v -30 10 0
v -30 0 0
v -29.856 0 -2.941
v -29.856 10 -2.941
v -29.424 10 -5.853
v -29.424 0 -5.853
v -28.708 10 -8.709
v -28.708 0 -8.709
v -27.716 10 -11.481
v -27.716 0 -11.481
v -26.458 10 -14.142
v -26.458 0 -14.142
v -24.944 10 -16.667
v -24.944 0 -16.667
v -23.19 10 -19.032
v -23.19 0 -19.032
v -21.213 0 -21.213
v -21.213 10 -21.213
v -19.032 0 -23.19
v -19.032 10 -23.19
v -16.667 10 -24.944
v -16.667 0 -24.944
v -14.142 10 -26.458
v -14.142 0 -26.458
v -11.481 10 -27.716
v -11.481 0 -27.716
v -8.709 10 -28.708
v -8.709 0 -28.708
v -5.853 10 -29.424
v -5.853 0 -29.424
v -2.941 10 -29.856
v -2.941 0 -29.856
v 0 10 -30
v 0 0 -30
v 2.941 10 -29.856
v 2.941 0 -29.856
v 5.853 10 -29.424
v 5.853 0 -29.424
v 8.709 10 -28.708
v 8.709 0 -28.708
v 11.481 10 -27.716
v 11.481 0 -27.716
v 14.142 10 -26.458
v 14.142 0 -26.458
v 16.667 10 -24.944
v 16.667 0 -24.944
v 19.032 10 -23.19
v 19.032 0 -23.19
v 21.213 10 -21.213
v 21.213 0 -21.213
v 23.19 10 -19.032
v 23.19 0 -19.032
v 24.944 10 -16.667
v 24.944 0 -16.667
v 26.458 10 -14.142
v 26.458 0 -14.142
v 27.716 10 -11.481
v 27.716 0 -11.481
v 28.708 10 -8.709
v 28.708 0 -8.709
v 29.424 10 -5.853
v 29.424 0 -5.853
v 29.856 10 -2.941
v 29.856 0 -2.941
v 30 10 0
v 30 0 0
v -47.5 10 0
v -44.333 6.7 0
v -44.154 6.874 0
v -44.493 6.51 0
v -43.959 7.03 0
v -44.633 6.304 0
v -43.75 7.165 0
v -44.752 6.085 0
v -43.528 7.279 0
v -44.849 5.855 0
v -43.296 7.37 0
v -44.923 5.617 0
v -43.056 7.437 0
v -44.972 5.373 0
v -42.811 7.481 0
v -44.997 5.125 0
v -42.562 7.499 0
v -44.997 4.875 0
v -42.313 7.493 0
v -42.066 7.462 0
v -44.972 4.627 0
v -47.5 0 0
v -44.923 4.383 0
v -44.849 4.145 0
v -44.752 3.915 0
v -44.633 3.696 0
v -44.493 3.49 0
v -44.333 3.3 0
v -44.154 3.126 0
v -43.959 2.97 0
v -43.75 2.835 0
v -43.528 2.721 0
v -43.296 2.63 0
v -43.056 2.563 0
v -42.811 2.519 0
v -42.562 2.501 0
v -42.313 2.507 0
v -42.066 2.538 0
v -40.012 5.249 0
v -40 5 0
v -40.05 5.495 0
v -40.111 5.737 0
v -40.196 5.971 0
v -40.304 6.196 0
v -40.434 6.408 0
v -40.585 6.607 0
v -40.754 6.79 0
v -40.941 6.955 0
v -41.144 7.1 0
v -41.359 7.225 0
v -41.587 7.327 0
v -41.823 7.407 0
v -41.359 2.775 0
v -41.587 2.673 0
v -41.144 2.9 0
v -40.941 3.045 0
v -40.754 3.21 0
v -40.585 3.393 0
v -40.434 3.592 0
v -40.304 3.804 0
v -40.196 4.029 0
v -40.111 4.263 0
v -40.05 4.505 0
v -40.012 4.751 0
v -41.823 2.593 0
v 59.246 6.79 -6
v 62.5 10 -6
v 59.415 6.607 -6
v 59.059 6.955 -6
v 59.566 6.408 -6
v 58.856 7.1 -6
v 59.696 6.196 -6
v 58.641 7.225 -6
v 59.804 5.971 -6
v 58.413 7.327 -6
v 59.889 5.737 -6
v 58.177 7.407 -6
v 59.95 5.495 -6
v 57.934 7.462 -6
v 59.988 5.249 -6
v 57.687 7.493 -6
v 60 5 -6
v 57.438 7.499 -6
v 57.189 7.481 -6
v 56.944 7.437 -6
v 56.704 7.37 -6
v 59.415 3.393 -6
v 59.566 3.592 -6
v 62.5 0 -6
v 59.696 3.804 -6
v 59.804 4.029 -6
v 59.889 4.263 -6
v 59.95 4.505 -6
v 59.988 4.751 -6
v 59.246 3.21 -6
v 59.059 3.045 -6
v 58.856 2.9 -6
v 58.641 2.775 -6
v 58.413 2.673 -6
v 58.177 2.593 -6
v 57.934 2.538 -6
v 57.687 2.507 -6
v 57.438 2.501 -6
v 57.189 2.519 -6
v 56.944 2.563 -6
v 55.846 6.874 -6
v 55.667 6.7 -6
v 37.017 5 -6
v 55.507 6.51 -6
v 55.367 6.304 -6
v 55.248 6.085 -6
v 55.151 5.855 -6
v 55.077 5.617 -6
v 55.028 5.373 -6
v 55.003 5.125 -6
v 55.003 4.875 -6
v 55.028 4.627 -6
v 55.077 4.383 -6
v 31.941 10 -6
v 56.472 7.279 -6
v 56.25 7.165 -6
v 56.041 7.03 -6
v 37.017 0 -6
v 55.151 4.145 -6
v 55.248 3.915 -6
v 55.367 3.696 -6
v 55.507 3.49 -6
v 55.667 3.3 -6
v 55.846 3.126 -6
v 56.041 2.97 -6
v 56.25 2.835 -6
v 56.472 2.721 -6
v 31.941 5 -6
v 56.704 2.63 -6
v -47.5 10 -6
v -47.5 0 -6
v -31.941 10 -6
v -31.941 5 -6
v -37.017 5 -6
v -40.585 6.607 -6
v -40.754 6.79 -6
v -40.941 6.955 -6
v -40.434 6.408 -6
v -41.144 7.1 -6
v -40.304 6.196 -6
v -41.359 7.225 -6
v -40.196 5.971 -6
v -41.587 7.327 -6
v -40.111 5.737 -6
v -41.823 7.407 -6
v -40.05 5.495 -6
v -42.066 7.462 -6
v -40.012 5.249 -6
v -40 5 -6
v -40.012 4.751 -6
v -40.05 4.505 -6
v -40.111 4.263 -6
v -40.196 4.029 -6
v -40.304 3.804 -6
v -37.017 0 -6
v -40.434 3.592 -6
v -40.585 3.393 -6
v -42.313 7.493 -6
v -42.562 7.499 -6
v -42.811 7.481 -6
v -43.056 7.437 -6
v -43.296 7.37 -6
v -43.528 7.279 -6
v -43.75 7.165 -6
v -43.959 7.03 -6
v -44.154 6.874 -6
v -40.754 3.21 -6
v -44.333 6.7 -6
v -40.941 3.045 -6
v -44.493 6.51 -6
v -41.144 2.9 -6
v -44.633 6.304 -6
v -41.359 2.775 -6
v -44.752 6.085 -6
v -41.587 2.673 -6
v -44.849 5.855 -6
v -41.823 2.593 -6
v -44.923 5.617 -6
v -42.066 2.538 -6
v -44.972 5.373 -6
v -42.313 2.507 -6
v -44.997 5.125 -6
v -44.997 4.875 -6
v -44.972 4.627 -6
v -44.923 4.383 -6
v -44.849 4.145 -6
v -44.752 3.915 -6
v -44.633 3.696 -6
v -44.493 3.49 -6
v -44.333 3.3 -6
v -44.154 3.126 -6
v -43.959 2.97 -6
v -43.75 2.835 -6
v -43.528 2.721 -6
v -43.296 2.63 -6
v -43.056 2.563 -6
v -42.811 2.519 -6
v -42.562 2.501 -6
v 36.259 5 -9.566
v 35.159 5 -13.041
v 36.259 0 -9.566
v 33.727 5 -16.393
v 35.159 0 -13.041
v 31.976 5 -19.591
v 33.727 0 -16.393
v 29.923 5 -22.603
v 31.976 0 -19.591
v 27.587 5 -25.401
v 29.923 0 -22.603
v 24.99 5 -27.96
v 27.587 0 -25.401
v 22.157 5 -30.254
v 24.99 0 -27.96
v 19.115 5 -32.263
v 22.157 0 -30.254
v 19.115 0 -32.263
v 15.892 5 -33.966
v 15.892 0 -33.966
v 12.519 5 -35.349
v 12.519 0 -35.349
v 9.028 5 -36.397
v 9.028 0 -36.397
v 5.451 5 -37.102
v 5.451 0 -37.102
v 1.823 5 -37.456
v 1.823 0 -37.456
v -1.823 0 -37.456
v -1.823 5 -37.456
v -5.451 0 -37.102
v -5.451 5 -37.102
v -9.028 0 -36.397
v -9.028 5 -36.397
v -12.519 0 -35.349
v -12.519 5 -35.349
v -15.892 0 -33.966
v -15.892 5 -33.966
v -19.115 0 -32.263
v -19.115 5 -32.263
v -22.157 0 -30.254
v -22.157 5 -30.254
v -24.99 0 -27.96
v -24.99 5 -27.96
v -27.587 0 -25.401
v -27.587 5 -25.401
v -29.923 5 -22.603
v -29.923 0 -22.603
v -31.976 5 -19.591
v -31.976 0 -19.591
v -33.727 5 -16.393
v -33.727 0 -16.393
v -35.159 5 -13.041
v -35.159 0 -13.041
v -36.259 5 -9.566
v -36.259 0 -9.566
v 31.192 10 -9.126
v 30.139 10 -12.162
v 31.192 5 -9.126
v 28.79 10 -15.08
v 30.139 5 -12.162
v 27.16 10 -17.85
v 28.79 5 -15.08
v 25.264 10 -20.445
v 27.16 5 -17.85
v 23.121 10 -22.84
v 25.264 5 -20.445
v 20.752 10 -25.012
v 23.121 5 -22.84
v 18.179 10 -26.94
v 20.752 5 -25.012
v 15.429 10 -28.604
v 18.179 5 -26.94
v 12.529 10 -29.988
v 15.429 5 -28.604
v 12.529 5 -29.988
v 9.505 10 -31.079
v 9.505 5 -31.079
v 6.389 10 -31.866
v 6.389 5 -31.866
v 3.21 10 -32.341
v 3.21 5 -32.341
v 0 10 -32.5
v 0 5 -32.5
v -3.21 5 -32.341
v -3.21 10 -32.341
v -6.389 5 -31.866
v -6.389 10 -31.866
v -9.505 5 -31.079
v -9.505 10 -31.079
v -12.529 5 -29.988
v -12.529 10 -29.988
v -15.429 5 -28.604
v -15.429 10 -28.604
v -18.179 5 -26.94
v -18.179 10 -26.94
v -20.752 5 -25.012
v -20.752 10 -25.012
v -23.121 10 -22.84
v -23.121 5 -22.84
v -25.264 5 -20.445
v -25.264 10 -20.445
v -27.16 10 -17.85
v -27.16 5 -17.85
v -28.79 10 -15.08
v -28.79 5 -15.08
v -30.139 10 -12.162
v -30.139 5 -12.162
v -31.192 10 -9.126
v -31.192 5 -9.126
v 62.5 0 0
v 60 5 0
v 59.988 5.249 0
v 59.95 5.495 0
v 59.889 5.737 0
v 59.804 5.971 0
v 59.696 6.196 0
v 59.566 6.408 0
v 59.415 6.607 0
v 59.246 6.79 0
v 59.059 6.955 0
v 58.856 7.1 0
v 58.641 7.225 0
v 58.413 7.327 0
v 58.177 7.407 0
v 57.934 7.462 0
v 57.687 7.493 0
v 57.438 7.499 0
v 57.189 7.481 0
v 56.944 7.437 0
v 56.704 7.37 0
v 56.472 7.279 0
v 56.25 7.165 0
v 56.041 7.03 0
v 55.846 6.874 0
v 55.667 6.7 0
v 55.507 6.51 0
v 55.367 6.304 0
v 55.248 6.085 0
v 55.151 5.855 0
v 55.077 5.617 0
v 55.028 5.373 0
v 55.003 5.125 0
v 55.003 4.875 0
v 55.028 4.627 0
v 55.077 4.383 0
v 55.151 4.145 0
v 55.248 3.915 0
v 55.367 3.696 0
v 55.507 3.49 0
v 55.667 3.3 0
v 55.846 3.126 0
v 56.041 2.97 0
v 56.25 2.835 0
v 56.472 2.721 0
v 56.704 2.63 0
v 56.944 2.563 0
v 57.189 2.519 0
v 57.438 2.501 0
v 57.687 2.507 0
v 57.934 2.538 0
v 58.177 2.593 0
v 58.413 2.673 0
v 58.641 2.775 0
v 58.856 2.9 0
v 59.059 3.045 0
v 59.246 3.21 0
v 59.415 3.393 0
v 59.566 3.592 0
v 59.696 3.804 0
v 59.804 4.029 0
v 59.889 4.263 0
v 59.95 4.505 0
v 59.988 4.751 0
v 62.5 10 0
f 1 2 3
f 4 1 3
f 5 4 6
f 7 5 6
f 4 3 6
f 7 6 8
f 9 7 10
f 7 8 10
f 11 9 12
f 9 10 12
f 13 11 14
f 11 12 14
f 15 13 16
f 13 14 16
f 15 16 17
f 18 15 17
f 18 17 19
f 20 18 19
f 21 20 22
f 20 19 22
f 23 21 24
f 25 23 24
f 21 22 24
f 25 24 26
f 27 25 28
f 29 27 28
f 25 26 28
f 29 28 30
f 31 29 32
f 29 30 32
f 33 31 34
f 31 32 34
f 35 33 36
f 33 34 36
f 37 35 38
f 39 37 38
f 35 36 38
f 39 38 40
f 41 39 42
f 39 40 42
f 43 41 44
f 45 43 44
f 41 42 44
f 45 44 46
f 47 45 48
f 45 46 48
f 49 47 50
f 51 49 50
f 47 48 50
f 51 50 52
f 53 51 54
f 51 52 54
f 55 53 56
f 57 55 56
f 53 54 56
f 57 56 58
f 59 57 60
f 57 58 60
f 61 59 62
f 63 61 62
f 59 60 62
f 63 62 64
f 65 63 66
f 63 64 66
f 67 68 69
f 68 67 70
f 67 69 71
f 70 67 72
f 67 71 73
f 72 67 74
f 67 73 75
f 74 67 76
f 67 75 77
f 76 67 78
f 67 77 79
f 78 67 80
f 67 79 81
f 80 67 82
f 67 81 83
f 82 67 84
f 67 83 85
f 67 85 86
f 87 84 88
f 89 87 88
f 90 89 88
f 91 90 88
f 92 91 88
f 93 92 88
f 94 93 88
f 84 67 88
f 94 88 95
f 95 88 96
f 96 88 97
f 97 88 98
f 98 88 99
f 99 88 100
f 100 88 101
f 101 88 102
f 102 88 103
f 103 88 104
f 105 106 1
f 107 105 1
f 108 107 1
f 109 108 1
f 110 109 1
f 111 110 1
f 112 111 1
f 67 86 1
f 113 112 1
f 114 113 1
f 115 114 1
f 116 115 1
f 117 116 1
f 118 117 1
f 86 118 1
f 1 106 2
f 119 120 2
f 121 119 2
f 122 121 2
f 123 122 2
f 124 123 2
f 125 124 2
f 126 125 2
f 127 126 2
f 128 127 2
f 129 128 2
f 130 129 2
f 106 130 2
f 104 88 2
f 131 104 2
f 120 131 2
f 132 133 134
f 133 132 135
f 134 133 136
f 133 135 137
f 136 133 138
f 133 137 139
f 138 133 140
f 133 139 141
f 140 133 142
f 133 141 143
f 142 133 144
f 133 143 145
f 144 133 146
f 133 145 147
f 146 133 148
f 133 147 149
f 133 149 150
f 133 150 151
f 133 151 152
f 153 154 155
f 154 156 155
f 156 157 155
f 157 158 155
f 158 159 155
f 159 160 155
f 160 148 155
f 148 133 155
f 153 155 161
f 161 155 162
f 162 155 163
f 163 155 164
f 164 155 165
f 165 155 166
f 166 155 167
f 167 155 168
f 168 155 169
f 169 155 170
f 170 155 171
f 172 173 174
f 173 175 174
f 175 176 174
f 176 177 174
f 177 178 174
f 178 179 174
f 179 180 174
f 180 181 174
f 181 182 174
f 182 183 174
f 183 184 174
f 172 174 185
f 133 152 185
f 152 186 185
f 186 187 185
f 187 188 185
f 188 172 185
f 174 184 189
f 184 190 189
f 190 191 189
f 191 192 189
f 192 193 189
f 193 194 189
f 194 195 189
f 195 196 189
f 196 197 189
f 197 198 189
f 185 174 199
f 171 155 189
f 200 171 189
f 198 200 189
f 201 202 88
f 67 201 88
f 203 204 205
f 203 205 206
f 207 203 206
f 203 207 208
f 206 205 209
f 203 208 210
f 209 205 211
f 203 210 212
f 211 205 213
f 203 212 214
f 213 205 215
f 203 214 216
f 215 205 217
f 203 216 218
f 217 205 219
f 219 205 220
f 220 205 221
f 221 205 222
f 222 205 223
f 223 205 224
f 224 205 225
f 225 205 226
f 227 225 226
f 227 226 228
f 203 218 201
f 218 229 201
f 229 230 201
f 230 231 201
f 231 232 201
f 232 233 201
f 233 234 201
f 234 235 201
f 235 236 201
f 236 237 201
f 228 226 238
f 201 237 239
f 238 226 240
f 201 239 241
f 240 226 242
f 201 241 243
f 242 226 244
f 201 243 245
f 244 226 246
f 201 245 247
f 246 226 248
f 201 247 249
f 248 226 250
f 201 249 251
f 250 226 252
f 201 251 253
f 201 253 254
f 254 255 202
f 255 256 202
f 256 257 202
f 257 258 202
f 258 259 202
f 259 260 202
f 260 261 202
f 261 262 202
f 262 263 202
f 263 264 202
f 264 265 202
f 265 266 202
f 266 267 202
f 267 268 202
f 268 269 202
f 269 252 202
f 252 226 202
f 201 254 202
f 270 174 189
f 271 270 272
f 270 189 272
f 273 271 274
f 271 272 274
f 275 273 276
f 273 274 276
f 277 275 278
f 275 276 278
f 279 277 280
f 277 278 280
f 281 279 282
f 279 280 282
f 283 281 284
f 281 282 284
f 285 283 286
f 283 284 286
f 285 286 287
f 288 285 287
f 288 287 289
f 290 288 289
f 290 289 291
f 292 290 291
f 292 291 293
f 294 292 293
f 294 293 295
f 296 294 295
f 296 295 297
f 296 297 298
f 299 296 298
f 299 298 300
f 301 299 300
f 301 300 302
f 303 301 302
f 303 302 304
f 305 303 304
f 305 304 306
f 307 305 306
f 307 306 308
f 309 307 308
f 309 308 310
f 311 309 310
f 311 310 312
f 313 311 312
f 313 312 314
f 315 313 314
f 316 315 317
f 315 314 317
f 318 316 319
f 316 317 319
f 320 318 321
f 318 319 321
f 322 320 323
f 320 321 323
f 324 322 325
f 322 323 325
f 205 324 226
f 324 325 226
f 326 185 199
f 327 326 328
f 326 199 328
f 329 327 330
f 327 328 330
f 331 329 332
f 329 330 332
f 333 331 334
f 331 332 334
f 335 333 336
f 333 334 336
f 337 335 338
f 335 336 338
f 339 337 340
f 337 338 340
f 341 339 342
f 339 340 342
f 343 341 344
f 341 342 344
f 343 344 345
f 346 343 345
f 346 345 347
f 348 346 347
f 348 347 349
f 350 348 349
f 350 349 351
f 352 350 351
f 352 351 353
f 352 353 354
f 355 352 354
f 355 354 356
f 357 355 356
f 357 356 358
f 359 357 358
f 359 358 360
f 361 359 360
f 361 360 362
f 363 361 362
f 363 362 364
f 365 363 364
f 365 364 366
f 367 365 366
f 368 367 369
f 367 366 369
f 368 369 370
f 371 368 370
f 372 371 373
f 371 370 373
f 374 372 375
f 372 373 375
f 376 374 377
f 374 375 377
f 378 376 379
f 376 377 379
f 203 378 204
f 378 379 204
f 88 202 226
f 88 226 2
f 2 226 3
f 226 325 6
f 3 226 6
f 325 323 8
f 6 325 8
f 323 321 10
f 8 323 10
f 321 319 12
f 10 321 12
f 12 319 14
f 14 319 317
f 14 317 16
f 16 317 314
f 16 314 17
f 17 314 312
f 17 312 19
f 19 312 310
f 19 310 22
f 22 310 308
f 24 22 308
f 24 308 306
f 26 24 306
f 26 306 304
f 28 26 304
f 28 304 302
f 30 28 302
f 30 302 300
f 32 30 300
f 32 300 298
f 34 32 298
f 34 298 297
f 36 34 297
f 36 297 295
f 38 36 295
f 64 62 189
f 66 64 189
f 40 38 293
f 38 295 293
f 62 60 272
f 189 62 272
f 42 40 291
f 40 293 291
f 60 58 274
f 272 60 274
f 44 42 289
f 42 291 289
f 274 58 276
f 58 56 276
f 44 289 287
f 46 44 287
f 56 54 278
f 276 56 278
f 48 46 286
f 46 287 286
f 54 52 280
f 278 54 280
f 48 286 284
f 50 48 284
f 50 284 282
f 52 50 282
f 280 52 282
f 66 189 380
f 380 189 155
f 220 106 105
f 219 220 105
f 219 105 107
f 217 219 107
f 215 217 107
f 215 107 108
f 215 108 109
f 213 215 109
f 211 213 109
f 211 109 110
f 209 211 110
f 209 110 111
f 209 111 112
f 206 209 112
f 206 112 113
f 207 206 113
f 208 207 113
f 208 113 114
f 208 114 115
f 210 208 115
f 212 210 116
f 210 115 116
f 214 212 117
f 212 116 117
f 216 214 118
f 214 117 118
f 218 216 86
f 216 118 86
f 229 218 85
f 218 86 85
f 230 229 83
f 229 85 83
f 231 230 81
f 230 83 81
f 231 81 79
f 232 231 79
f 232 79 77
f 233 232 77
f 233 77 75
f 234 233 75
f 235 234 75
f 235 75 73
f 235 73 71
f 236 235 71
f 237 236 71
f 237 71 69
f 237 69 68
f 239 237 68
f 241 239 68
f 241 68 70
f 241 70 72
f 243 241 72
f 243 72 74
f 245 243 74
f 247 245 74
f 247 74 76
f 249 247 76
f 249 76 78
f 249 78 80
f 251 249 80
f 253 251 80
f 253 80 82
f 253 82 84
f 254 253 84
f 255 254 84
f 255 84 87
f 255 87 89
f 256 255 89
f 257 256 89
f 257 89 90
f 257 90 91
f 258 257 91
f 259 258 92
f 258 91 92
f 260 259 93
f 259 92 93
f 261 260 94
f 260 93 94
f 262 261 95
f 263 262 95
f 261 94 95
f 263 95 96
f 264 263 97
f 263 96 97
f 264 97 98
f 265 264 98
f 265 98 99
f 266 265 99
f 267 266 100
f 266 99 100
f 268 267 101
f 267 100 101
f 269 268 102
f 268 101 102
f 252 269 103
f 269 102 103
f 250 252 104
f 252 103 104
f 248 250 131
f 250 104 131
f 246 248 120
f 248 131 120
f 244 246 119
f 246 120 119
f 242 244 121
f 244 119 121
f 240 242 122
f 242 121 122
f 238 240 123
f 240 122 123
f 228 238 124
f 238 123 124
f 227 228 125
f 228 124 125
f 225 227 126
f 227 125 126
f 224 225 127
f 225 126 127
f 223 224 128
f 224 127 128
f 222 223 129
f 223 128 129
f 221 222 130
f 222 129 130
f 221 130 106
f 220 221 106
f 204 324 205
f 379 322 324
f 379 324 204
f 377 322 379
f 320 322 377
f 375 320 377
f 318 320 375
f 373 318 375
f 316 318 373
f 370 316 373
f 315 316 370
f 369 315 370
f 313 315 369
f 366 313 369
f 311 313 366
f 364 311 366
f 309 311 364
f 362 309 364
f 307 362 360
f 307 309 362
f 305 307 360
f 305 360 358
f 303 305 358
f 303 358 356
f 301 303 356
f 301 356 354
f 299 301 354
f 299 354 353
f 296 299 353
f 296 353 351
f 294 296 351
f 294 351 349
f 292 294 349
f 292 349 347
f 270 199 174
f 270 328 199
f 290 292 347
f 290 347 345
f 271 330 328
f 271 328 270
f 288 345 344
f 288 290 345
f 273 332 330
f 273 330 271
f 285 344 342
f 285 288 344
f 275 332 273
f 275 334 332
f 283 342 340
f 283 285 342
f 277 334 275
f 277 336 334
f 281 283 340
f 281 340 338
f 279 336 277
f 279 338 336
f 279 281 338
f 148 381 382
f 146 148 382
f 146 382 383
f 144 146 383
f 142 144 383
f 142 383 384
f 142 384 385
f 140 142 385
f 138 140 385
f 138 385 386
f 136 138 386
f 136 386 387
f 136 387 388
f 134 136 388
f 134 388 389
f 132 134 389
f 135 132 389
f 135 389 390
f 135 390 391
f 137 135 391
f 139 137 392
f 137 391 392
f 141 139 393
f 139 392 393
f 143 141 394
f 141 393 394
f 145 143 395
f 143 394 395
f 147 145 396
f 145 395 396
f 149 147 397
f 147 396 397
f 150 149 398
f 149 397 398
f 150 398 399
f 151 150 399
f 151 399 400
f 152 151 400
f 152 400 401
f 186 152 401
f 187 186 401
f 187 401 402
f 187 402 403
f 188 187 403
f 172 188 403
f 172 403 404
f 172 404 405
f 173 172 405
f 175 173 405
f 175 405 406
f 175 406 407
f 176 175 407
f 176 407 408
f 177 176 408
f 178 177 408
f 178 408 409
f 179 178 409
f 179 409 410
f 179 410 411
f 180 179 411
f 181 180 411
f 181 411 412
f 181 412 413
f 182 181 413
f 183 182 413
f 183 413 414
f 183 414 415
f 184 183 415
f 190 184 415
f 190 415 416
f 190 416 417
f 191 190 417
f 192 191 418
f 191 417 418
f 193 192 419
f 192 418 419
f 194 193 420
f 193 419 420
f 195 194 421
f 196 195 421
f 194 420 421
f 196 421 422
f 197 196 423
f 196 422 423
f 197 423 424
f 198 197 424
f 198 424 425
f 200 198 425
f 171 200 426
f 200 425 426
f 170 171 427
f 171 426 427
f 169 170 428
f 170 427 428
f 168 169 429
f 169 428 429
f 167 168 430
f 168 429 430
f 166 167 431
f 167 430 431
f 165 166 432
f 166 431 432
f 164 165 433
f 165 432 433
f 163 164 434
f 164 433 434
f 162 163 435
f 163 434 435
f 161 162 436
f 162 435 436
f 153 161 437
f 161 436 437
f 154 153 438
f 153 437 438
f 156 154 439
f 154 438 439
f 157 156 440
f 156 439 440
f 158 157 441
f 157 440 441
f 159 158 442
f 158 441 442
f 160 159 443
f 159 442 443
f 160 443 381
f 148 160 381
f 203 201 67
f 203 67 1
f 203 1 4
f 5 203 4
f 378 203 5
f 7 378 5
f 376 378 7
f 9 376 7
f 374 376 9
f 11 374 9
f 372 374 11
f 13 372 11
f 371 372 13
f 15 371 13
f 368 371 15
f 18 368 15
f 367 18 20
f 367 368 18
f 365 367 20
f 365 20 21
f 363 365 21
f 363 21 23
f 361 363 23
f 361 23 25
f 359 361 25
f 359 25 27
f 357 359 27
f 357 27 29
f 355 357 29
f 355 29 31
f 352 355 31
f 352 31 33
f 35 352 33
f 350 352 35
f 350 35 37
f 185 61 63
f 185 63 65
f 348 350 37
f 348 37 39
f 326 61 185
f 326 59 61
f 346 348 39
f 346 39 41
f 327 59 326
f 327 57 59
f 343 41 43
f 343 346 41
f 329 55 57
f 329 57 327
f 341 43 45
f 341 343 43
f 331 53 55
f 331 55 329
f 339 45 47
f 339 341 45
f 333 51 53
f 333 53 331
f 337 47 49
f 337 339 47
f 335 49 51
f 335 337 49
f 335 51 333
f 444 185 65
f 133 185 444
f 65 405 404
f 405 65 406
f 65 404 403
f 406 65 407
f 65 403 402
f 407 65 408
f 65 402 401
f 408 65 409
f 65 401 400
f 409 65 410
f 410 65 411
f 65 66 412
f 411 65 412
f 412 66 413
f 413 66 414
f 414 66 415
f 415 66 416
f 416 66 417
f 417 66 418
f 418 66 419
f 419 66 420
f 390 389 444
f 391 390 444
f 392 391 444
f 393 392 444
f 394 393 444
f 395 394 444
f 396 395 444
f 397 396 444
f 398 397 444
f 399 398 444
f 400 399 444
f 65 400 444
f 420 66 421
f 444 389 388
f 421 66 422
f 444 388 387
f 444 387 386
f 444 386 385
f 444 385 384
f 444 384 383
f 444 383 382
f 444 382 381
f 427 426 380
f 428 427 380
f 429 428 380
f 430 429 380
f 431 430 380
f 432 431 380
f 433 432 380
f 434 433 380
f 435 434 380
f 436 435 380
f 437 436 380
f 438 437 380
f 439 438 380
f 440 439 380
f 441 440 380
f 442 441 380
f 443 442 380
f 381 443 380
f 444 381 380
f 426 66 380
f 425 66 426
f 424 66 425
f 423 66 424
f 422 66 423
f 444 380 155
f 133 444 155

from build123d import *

# Parameters (mm, degrees)
BOSS_EXTRUDE1_DEPTH = 10
SKETCH3_R           = 2.5
CUT_EXTRUDE1_DEPTH  = 10
BOSS_EXTRUDE2_DEPTH = 5


with BuildPart() as part:
    # Sketch1 → Boss-Extrude1 (new body)
    with BuildSketch(Plane(origin=(0, 0, 0), x_dir=(1, 0, 0), z_dir=(0, 1, 0))):
        with BuildLine():
            Line((62.5, 6), (31.941352507, 6))
            ThreePointArc((31.941352507, 6), (0, 32.5), (-31.941352507, 6))
            Line((-31.941352507, 6), (-47.5, 6))
            Line((-47.5, 6), (-47.5, 0))
            Line((-47.5, 0), (-30, 0))
            ThreePointArc((-30, 0), (0, 30), (30, 0))
            Line((30, 0), (62.5, 0))
            Line((62.5, 0), (62.5, 6))
        make_face()
    extrude(amount=BOSS_EXTRUDE1_DEPTH)

    # Sketch3 → Cut-Extrude1 (cut)
    with BuildSketch(Plane.XY):
        with Locations((57.5, 5)):
            Circle(SKETCH3_R)
        with Locations((-42.5, 5)):
            Circle(SKETCH3_R)
    extrude(amount=-CUT_EXTRUDE1_DEPTH, mode=Mode.SUBTRACT)

    # Sketch5 → Boss-Extrude2 (add)
    with BuildSketch(Plane(origin=(0, 0, 0), x_dir=(1, 0, 0), z_dir=(0, 1, 0))):
        with BuildLine():
            ThreePointArc((37.5, 0), (0, 37.5), (-37.5, 0))
            Line((-37.5, 0), (-32.5, 0))
            ThreePointArc((-32.5, 0), (0, 32.5), (32.5, 0))
            Line((32.5, 0), (37.5, 0))
        make_face()
    extrude(amount=BOSS_EXTRUDE2_DEPTH)


solid = part.part
